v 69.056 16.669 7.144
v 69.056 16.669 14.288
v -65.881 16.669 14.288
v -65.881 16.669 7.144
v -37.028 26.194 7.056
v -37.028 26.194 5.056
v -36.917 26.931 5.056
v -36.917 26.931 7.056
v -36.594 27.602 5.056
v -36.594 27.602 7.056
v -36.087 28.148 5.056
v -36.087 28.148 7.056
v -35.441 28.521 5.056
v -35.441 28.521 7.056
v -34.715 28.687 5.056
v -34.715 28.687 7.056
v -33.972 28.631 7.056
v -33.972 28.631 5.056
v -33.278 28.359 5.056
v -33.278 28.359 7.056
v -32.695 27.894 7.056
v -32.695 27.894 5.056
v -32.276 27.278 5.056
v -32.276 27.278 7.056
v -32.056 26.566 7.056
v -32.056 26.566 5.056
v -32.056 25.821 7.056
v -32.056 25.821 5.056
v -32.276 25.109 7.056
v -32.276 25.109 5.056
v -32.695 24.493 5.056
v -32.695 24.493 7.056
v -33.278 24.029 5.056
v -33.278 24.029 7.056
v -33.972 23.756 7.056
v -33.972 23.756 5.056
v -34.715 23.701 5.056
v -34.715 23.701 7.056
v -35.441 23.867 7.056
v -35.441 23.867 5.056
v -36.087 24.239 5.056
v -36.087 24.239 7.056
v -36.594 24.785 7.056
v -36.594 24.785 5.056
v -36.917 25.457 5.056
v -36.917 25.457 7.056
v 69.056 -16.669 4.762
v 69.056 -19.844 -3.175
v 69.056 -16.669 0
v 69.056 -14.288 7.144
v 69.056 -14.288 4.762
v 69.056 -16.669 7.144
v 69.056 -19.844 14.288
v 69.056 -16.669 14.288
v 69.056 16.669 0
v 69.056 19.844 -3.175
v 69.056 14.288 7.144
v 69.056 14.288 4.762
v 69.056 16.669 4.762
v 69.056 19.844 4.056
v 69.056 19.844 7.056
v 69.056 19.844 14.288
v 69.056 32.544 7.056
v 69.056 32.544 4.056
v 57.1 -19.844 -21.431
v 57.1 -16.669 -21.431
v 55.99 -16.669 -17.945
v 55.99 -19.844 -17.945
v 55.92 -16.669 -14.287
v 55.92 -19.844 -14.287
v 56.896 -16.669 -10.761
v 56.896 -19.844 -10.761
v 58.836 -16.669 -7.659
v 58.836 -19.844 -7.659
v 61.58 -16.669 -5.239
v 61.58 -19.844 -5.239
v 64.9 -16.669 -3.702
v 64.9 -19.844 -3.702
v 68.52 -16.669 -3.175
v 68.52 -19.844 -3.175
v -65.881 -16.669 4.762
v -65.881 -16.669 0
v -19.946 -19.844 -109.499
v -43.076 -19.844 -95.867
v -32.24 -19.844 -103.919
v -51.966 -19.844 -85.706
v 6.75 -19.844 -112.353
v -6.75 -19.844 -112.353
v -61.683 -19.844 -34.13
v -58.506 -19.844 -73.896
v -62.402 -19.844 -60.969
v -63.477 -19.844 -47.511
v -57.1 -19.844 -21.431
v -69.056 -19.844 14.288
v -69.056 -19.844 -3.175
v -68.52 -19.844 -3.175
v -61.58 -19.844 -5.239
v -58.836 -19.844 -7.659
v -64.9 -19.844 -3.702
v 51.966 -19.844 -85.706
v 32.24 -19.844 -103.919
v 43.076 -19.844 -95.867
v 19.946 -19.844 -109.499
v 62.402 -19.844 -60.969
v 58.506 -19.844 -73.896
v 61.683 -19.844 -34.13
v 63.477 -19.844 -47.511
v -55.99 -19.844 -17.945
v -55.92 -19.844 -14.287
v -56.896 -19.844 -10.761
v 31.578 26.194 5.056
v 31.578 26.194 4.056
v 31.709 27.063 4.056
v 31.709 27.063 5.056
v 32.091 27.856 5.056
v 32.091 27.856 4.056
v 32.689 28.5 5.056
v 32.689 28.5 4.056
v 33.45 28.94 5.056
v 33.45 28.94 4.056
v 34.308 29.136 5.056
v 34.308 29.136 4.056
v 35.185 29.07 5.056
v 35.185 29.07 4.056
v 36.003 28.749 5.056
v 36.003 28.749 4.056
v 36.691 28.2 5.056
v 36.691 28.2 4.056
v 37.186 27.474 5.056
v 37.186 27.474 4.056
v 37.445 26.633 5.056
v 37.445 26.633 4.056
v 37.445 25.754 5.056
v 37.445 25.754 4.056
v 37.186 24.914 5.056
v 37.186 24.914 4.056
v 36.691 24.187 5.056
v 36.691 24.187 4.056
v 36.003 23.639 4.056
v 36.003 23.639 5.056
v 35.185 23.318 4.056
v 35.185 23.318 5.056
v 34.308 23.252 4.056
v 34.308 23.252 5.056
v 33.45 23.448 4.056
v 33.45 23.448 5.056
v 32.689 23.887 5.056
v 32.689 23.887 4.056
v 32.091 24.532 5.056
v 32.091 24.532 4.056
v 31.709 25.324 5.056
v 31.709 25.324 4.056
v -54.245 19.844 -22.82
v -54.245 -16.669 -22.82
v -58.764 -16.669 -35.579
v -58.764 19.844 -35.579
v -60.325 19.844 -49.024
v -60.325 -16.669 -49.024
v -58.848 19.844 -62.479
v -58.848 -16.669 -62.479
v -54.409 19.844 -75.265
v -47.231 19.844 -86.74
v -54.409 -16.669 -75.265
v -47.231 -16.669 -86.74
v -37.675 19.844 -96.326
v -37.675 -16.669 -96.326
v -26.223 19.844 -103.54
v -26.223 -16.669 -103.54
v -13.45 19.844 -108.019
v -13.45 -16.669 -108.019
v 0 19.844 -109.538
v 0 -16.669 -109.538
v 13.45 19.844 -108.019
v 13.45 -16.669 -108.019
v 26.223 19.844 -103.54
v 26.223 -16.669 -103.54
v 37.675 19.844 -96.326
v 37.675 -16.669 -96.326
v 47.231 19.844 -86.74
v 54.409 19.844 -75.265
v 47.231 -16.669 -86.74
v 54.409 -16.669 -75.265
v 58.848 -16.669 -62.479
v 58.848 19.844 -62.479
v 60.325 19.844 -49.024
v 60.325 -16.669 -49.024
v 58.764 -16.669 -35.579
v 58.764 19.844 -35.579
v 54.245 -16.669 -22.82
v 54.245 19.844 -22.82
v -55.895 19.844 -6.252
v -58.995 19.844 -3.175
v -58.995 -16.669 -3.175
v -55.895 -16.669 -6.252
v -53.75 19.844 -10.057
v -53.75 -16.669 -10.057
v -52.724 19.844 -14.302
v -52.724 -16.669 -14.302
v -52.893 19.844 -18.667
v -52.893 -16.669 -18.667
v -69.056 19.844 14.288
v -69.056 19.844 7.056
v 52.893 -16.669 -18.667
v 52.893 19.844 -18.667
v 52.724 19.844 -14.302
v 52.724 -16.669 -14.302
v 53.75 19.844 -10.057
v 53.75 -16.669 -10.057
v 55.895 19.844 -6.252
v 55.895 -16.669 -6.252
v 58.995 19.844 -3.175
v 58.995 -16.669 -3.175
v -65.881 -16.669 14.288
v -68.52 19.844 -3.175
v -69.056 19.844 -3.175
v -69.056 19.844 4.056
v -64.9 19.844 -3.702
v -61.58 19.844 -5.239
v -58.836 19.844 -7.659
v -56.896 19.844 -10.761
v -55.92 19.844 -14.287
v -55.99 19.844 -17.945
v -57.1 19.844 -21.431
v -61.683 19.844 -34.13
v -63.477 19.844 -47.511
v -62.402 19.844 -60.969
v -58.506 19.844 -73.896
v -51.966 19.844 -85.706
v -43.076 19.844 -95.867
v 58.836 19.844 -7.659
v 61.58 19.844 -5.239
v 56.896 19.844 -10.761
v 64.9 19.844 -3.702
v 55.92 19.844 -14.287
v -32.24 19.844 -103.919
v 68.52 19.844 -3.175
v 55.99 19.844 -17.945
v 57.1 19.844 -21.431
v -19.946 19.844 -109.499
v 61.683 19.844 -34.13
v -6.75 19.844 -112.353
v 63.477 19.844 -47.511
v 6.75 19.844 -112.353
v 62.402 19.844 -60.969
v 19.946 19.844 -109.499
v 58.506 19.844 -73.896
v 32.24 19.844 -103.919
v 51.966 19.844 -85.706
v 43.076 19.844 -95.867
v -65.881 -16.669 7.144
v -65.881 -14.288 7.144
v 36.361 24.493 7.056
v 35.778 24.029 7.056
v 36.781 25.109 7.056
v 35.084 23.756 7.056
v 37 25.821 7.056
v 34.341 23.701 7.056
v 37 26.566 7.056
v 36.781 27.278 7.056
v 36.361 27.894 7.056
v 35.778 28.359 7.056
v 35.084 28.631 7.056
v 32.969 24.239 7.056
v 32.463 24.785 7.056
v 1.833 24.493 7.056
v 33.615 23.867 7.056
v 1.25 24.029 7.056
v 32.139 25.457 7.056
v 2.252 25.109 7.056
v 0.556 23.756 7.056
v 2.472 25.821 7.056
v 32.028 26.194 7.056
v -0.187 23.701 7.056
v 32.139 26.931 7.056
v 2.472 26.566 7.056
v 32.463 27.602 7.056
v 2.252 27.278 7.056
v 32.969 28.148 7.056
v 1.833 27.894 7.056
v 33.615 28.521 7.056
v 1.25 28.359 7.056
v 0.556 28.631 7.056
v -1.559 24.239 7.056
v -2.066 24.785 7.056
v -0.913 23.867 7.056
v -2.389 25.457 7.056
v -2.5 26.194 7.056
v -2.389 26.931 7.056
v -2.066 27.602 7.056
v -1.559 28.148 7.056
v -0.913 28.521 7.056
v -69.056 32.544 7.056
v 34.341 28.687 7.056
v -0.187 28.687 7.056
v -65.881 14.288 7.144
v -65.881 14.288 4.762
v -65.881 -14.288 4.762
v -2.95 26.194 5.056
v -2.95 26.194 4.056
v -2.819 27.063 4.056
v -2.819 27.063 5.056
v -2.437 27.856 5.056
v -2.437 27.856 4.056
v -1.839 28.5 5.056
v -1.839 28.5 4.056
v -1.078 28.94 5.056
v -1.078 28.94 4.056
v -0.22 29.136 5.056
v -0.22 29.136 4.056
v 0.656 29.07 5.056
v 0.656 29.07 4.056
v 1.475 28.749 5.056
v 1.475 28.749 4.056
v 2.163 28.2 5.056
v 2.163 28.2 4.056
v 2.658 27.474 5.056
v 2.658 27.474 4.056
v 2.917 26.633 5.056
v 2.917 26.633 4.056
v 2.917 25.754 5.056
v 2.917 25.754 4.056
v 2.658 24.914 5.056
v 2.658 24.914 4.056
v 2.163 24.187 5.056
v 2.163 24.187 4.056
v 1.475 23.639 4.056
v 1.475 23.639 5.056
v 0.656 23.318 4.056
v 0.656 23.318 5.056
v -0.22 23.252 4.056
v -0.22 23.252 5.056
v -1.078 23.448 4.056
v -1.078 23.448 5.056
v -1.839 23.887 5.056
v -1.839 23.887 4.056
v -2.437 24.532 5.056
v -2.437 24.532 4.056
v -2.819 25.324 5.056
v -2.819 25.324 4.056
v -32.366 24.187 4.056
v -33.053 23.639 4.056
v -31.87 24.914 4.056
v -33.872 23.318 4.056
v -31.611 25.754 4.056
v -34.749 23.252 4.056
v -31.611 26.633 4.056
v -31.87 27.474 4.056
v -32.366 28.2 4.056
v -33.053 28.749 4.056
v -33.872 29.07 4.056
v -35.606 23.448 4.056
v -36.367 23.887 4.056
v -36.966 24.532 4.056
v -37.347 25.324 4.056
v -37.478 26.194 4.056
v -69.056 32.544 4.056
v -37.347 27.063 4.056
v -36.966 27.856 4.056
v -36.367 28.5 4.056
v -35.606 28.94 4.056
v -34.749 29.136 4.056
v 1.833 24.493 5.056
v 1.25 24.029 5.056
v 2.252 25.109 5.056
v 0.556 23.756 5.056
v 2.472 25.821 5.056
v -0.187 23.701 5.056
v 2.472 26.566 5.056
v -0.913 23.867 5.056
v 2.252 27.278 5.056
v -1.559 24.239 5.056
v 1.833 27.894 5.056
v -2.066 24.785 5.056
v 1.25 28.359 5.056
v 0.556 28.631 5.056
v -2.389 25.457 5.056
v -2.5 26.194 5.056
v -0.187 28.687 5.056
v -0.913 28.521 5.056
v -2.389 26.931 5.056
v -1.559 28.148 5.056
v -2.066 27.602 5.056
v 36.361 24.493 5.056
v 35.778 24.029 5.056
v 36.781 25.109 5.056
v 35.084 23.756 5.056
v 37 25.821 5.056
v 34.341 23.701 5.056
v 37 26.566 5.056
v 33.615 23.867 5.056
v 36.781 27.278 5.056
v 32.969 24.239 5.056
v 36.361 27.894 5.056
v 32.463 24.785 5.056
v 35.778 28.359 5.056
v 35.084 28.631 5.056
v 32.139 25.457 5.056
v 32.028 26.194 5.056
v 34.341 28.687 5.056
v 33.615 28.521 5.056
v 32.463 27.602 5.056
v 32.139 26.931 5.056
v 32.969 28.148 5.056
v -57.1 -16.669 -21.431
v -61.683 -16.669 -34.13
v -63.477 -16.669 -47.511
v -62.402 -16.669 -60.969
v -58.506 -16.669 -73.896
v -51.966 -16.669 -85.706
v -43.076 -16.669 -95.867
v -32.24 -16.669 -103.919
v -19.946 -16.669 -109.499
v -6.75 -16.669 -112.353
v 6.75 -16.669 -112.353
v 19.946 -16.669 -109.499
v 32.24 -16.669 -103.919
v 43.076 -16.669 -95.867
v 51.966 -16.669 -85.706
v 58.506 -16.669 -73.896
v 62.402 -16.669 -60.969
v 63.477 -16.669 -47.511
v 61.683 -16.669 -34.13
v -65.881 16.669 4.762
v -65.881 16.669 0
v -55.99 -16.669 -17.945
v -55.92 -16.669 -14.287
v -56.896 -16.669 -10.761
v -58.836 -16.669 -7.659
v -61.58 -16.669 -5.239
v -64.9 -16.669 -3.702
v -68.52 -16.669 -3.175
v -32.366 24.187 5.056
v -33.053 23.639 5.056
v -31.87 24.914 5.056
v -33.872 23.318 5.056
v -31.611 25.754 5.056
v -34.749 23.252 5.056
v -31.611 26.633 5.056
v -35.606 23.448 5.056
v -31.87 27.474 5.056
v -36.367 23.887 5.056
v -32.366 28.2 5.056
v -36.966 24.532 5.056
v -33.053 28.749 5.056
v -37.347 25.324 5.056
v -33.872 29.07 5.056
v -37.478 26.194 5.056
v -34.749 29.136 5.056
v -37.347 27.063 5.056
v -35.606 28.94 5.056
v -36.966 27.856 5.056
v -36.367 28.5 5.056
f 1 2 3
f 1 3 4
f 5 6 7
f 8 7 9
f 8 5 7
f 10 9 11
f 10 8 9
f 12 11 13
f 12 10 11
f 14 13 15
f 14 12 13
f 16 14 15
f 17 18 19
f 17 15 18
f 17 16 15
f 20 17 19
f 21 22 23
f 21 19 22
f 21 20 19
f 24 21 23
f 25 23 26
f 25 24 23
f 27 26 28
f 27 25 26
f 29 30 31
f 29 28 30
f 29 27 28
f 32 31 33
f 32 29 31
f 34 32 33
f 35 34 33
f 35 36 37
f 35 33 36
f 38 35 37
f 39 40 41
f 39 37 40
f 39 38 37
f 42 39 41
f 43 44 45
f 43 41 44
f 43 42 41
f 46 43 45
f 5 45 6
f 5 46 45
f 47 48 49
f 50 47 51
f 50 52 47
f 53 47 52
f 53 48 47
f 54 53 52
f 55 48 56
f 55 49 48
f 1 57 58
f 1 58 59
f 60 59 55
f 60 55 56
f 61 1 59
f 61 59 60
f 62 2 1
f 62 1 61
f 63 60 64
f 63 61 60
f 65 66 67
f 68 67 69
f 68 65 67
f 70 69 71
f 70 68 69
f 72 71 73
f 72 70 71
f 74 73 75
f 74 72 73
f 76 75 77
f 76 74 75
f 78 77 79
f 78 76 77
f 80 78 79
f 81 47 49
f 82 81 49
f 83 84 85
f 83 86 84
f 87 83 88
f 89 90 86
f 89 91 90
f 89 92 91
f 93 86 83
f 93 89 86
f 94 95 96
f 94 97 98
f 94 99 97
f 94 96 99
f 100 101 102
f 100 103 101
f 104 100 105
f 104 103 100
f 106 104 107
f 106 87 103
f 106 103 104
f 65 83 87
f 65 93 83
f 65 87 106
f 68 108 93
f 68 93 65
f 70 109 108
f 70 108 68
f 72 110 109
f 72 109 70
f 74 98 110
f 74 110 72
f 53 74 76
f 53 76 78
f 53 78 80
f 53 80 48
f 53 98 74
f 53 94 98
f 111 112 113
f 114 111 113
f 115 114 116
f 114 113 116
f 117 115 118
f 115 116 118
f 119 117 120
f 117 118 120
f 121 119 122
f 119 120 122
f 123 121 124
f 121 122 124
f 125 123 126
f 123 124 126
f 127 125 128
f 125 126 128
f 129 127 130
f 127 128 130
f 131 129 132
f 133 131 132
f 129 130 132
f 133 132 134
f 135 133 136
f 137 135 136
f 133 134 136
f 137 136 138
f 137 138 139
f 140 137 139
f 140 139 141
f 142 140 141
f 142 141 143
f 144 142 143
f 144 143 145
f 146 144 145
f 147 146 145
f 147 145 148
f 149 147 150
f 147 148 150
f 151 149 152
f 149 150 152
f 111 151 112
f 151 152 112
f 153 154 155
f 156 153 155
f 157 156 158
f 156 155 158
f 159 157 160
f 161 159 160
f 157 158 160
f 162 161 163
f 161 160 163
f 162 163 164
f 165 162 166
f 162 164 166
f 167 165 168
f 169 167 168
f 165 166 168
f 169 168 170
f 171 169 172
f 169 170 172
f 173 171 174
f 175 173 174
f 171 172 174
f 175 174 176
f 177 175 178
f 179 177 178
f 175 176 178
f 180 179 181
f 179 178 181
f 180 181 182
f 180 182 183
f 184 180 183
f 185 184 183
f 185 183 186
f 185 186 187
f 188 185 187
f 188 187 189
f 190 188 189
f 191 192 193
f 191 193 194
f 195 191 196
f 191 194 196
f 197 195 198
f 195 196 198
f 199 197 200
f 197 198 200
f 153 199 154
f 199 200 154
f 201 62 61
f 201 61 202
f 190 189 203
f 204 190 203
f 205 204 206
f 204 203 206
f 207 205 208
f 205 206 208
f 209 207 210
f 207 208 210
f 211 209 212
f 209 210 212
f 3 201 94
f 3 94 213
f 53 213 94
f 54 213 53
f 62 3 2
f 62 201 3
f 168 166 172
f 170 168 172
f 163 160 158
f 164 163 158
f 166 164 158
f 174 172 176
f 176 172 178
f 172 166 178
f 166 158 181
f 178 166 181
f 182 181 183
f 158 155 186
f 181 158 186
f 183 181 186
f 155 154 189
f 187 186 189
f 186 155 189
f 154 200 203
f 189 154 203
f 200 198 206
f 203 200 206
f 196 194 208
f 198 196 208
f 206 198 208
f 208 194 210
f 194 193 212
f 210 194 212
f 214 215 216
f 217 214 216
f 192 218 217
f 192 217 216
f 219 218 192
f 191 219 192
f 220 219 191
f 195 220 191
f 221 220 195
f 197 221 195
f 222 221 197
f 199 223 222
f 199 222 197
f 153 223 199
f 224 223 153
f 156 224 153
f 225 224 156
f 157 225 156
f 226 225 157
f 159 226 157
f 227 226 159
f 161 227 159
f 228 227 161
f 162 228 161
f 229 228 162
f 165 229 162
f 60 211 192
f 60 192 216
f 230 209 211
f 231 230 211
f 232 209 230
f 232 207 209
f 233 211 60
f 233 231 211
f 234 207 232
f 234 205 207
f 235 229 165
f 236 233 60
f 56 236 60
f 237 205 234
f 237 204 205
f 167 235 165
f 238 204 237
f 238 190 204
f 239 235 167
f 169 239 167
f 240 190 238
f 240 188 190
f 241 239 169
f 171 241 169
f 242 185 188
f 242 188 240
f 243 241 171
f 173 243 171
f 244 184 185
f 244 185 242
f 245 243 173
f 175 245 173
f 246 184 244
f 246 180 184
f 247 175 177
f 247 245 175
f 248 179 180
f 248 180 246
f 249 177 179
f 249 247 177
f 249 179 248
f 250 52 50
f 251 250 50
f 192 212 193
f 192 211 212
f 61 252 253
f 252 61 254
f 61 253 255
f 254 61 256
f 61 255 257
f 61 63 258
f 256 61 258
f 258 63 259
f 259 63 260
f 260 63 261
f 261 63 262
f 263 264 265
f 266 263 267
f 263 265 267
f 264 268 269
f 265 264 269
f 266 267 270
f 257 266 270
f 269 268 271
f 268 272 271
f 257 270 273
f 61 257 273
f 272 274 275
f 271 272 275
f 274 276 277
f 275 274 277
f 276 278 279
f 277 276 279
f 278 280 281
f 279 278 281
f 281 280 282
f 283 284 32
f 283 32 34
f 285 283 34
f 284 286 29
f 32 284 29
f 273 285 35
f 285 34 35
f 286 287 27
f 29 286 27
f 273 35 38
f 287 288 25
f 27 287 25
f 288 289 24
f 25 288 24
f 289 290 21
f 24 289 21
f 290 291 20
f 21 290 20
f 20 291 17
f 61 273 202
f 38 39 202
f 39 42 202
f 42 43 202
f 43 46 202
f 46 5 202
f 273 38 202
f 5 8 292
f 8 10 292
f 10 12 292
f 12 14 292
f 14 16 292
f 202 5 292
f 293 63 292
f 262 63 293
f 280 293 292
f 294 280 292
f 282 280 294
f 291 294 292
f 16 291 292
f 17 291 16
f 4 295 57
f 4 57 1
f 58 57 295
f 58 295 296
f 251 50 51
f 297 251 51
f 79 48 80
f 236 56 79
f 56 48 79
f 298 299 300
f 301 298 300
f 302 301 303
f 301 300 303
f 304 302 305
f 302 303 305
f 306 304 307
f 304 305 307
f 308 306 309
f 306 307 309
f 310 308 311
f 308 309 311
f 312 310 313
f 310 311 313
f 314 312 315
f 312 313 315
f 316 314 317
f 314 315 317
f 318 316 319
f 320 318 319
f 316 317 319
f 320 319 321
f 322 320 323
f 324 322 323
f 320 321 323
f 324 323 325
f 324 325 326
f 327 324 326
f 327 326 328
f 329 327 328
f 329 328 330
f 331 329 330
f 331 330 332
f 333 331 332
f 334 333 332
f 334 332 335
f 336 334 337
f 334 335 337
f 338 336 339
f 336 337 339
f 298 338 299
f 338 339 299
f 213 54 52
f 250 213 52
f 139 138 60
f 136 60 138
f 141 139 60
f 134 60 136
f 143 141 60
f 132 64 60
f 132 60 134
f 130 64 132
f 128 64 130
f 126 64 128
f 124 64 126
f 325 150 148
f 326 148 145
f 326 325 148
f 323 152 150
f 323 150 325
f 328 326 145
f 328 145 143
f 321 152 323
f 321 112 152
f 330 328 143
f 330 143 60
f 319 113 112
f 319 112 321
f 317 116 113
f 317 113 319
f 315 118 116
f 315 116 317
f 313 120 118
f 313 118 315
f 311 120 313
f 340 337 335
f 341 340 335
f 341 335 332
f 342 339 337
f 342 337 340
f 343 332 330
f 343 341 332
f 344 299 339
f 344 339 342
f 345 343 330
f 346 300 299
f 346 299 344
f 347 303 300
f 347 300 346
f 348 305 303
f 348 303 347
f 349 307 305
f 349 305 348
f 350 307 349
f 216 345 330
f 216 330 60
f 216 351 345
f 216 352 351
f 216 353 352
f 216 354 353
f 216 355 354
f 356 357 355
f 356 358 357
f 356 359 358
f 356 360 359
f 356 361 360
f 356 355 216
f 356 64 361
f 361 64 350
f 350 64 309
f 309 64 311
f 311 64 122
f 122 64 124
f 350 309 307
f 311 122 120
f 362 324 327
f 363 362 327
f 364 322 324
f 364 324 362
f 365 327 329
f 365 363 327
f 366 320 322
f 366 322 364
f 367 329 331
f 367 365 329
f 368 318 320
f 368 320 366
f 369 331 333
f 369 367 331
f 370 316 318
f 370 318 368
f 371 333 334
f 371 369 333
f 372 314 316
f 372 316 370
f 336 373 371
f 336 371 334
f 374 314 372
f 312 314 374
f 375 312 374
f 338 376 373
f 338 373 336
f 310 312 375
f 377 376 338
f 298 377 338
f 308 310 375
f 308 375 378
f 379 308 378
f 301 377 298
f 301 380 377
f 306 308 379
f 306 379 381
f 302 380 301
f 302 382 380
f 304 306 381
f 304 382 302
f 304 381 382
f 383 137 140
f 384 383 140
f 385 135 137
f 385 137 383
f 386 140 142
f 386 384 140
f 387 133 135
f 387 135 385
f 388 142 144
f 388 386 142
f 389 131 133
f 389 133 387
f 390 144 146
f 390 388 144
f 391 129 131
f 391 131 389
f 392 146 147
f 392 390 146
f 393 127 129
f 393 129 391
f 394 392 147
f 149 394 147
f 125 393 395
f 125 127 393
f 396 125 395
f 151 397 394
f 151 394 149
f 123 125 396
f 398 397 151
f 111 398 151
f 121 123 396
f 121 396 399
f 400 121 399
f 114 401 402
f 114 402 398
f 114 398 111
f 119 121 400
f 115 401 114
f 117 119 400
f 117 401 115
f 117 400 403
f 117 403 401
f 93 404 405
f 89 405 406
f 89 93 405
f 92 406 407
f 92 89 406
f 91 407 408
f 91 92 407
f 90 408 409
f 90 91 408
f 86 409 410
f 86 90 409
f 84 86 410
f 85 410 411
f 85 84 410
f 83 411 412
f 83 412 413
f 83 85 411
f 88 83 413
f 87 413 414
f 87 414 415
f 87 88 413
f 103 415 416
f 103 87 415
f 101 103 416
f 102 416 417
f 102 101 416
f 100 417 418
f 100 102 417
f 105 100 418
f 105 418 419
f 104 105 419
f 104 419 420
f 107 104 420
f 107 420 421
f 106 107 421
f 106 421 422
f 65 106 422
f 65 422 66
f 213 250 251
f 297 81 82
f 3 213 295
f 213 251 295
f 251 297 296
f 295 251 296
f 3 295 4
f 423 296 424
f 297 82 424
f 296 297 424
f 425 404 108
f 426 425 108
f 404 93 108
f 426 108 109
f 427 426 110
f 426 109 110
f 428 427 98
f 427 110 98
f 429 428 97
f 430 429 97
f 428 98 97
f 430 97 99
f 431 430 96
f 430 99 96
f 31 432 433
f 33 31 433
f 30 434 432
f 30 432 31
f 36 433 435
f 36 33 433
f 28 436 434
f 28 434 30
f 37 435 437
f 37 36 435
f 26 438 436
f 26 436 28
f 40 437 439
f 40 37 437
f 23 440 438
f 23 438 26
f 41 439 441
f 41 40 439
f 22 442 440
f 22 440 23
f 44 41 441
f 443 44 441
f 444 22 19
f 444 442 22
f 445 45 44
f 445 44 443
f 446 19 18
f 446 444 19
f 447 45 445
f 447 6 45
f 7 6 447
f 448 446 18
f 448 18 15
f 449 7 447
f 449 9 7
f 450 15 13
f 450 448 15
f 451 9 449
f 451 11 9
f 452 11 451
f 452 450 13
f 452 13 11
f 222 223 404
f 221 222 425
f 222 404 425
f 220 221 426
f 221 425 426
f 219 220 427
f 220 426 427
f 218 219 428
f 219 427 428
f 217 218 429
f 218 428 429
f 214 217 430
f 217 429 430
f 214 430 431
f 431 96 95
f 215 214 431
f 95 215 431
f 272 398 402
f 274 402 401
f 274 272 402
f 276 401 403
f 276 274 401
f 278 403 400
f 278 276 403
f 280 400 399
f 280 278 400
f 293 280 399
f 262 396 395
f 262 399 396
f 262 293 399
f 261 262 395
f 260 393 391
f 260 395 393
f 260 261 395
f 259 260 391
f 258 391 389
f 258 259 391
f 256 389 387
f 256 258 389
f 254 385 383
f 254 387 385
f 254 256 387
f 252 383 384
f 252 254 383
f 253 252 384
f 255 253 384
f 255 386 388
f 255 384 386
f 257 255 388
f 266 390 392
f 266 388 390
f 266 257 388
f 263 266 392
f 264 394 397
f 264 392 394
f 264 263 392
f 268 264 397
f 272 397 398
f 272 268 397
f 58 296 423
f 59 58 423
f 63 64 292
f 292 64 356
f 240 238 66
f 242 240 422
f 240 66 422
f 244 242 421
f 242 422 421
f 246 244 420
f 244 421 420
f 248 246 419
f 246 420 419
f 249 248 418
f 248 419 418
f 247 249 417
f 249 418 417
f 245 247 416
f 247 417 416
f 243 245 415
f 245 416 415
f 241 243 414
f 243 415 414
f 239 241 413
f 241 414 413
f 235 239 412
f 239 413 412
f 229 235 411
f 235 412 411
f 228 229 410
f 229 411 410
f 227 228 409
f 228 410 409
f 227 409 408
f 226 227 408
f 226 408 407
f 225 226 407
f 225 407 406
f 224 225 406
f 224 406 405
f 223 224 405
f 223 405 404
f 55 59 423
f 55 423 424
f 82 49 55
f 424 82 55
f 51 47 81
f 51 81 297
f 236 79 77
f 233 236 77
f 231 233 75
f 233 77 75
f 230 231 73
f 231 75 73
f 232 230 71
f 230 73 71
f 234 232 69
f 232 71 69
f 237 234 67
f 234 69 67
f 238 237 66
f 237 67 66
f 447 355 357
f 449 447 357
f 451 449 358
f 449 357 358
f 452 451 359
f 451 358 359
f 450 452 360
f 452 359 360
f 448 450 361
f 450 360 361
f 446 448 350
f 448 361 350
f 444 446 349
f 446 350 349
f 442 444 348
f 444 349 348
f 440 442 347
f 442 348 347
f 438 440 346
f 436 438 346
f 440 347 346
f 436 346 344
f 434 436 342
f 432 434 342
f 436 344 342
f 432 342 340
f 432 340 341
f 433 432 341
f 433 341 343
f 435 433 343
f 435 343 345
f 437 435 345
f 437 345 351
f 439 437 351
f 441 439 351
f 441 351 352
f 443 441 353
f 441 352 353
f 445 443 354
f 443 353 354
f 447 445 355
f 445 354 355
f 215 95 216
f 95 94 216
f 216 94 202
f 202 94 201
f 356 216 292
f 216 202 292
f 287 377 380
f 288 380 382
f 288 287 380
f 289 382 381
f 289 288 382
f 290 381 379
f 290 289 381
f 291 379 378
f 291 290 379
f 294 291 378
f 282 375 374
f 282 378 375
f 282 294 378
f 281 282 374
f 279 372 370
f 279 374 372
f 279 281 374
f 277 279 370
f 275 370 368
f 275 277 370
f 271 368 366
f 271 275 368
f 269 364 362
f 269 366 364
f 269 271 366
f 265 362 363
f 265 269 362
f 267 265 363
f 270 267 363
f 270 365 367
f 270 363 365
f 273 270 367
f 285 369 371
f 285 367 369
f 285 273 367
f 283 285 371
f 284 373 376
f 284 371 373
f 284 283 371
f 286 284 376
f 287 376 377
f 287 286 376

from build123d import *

# Parameters (mm, degrees)
SKETCH1_W           = 138.1125
SKETCH1_H           = 39.6875
SKETCH1_W_2         = 131.7625
SKETCH1_H_2         = 33.3375
BOSS_EXTRUDE1_DEPTH = 14.2875
SKETCH2_W           = 138.1125
SKETCH2_H           = 39.6875
BOSS_EXTRUDE2_DEPTH = 3.175
CUT_EXTRUDE1_REACH  = 142.26
SKETCH3_W           = 14.2875
SKETCH3_H           = 33.3375
BOSS_EXTRUDE3_REACH = 142.26
SKETCH4_W           = 2.38125
SKETCH4_H           = 2.38125
BOSS_EXTRUDE4_START = -8.73125
SKETCH6_W           = 138.1125
SKETCH6_H           = 12.7
SKETCH6_R           = 2.5
BOSS_EXTRUDE4_DEPTH = 1.5
SKETCH7_R           = 2.95
CUT_EXTRUDE2_DEPTH  = 1
SKETCH8_R           = 63.5
BOSS_EXTRUDE5_DEPTH = 3.175
FILLET1_R           = 12.7
BOSS_EXTRUDE6_DEPTH = 36.5125


with BuildPart() as part:
    # Sketch1 → Boss-Extrude1 (new body)
    with BuildSketch(Plane.XY):
        Rectangle(SKETCH1_W, SKETCH1_H)
        Rectangle(SKETCH1_W_2, SKETCH1_H_2, mode=Mode.SUBTRACT)
    extrude(amount=BOSS_EXTRUDE1_DEPTH)

    # Sketch2 → Boss-Extrude2 (add)
    with BuildSketch(Plane(origin=(0, 0, 0), x_dir=(-1, 0, 0), z_dir=(0, 0, -1))):
        Rectangle(SKETCH2_W, SKETCH2_H)
    extrude(amount=BOSS_EXTRUDE2_DEPTH)

    # Sketch3 → Cut-Extrude1 (cut, up to next)
    with BuildSketch(Plane(origin=(69.05625, 0, 0), x_dir=(0, 0, -1), z_dir=(1, 0, 0)), mode=Mode.PRIVATE) as cut_extrude1_sk1:
        with Locations((-7.14375, 0)):
            Rectangle(SKETCH3_W, SKETCH3_H)
    cut_extrude1_tool1 = extrude(cut_extrude1_sk1.sketch, amount=-CUT_EXTRUDE1_REACH, mode=Mode.PRIVATE) & part.part
    add(cut_extrude1_tool1.solids().sort_by_distance((69.05625, 0, 7.14375))[0], mode=Mode.SUBTRACT)

    # Sketch4 → Boss-Extrude3 (add, up to next)
    with BuildSketch(Plane(origin=(69.05625, 0, 0), x_dir=(0, 0, -1), z_dir=(1, 0, 0)), mode=Mode.PRIVATE) as boss_extrude3_sk1:
        with Locations((-5.953125, -15.478125)):
            Rectangle(SKETCH4_W, SKETCH4_H)
    boss_extrude3_tool1 = extrude(boss_extrude3_sk1.sketch, amount=-BOSS_EXTRUDE3_REACH, mode=Mode.PRIVATE) - part.part
    # Sketch4 → Boss-Extrude3 (add, up to next)
    with BuildSketch(Plane(origin=(69.05625, 0, 0), x_dir=(0, 0, -1), z_dir=(1, 0, 0)), mode=Mode.PRIVATE) as boss_extrude3_sk2:
        with Locations((-5.953125, 15.478125)):
            Rectangle(SKETCH4_W, SKETCH4_H)
    boss_extrude3_tool2 = extrude(boss_extrude3_sk2.sketch, amount=-BOSS_EXTRUDE3_REACH, mode=Mode.PRIVATE) - part.part
    add(boss_extrude3_tool1.solids().sort_by_distance((69.05625, -15.478125, 5.953125))[0])
    add(boss_extrude3_tool2.solids().sort_by_distance((69.05625, 15.478125, 5.953125))[0])

    # Sketch6 → Boss-Extrude4 (add, symmetric)
    with BuildSketch(Plane(origin=(0, 0, -3.175), x_dir=(-1, 0, 0), z_dir=(0, 0, -1)).offset(BOSS_EXTRUDE4_START)):
        with Locations((0, 26.19375)):
            Rectangle(SKETCH6_W, SKETCH6_H)
        with Locations((0, 26.19375)):
            Circle(SKETCH6_R, mode=Mode.SUBTRACT)
        with Locations((-34.528125, 26.19375)):
            Circle(SKETCH6_R, mode=Mode.SUBTRACT)
        with Locations((34.528125, 26.19375)):
            Circle(SKETCH6_R, mode=Mode.SUBTRACT)
    extrude(amount=BOSS_EXTRUDE4_DEPTH, both=True)

    # Sketch7 → Cut-Extrude2 (cut)
    with BuildSketch(Plane(origin=(0, 0, 4.05625), x_dir=(-1, 0, 0), z_dir=(0, 0, -1))):
        with Locations((-34.528125, 26.19375)):
            Circle(SKETCH7_R)
        with Locations((0, 26.19375)):
            Circle(SKETCH7_R)
        with Locations((34.528125, 26.19375)):
            Circle(SKETCH7_R)
    extrude(amount=-CUT_EXTRUDE2_DEPTH, mode=Mode.SUBTRACT)

    # Sketch8 → Boss-Extrude5 (add)
    with BuildSketch(Plane.XZ.offset(19.84375)):
        with Locations((0, -49.2125)):
            Circle(SKETCH8_R)
    extrude(amount=-BOSS_EXTRUDE5_DEPTH)

    # Fillet1
    fillet1_edges = [part.edges().sort_by_distance(p)[0] for p in [
        (-43.735552972, -18.25625, -3.175),
        (43.735552972, -18.25625, -3.175),
    ]]
    fillet(fillet1_edges, radius=FILLET1_R)

    # Sketch10 → Boss-Extrude6 (add)
    with BuildSketch(Plane(origin=(0, -16.66875, 0), x_dir=(1, 0, 0), z_dir=(0, 1, 0))):
        with BuildLine():
            Line((-68.520442889, 3.175), (-58.995442889, 3.175))
            ThreePointArc((-58.995442889, 3.175), (-53.090093775, 12.144054919), (-54.245350621, 22.8203125))
            ThreePointArc((-54.245350621, 22.8203125), (0, 109.5375), (54.245350621, 22.8203125))
            ThreePointArc((54.245350621, 22.8203125), (53.090093775, 12.144054919), (58.995442889, 3.175))
            Line((58.995442889, 3.175), (68.520442889, 3.175))
            ThreePointArc((68.520442889, 3.175), (57.753494041, 9.139807909), (57.100369074, 21.43125))
            ThreePointArc((57.100369074, 21.43125), (0, 112.7125), (-57.100369074, 21.43125))
            ThreePointArc((-57.100369074, 21.43125), (-57.753494041, 9.139807909), (-68.520442889, 3.175))
        make_face()
    extrude(amount=BOSS_EXTRUDE6_DEPTH)


solid = part.part
